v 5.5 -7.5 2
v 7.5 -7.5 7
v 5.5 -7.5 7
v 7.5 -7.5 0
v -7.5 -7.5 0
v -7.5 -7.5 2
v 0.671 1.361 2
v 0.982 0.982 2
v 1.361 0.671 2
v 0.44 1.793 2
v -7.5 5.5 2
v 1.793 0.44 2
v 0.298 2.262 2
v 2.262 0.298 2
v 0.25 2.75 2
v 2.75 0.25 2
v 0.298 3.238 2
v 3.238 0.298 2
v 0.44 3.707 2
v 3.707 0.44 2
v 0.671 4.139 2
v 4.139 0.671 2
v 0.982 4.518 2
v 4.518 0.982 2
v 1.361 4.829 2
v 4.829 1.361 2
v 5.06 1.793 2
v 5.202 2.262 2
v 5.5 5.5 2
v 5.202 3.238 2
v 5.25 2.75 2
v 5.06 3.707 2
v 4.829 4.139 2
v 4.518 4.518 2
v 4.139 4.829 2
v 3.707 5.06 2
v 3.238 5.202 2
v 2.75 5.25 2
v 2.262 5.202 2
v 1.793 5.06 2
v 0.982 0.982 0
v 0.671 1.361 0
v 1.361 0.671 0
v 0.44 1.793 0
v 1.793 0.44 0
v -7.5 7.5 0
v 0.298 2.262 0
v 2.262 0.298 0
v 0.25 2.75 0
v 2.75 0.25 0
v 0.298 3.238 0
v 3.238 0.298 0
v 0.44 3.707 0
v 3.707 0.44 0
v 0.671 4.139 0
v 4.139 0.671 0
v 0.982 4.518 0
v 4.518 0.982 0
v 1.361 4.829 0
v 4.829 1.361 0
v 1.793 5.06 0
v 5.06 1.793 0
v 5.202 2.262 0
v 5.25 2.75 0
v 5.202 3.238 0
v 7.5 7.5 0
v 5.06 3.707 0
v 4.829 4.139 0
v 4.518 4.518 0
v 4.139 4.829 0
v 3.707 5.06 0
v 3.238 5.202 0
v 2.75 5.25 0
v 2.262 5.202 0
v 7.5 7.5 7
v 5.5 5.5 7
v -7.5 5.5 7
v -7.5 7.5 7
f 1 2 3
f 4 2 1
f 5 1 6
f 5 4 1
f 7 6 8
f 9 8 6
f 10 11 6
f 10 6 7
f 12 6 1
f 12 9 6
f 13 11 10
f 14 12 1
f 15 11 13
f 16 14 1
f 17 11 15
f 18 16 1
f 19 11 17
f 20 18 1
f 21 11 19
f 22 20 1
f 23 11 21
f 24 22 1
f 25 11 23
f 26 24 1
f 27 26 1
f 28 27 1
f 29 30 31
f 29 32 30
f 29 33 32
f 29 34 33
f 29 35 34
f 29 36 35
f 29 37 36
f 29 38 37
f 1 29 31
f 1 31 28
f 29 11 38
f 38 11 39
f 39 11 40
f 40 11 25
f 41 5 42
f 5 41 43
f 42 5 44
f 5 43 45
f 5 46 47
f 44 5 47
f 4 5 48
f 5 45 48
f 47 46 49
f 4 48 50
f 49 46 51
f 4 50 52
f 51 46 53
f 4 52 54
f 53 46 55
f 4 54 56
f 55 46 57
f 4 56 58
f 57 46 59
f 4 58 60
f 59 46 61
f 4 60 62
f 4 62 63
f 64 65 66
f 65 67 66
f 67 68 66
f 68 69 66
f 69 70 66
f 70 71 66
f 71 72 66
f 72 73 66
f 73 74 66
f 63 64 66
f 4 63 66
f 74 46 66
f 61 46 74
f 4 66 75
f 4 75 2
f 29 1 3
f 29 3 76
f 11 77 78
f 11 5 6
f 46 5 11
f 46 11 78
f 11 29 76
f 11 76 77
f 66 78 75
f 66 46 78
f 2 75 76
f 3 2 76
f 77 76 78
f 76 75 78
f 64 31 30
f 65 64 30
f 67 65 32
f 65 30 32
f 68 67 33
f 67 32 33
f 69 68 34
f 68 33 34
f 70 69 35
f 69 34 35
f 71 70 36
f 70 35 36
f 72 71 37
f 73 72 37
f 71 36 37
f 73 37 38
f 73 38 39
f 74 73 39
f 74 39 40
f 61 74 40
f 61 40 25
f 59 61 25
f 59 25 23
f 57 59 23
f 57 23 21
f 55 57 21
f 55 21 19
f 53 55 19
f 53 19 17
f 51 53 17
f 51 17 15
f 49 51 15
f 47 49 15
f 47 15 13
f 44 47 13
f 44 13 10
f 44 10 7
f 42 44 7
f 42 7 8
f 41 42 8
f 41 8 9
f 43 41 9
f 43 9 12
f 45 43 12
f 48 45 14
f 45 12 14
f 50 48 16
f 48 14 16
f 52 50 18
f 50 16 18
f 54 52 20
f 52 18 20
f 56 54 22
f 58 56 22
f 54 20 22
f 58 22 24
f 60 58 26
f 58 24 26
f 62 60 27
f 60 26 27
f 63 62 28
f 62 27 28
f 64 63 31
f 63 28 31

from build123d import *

# Parameters (mm, degrees)
SKETCH_W     = 15
SKETCH_H     = 15
PAD_DEPTH    = 2
PAD001_DEPTH = 5
SKETCH002_R  = 2.5
POCKET_DEPTH = 5


with BuildPart() as part:
    # Sketch → Pad (new body)
    with BuildSketch(Plane.XY):
        Rectangle(SKETCH_W, SKETCH_H)
    extrude(amount=PAD_DEPTH)

    # Sketch001 (on Face6 of Pad) → Pad001 (join)
    with BuildSketch(Plane.XY.offset(2)):
        Polygon((-7.5, 7.5), (7.5, 7.5), (7.5, -7.5), (5.5, -7.5), (5.5, 5.5), (-7.5, 5.5), align=None)
    extrude(amount=PAD001_DEPTH)

    # Sketch002 (on Face3 of Pad001) → Pocket (cut)
    with BuildSketch(Plane.XY.offset(2)):
        with Locations((2.75, 2.75)):
            Circle(SKETCH002_R)
    extrude(amount=-POCKET_DEPTH, mode=Mode.SUBTRACT)


solid = part.part
